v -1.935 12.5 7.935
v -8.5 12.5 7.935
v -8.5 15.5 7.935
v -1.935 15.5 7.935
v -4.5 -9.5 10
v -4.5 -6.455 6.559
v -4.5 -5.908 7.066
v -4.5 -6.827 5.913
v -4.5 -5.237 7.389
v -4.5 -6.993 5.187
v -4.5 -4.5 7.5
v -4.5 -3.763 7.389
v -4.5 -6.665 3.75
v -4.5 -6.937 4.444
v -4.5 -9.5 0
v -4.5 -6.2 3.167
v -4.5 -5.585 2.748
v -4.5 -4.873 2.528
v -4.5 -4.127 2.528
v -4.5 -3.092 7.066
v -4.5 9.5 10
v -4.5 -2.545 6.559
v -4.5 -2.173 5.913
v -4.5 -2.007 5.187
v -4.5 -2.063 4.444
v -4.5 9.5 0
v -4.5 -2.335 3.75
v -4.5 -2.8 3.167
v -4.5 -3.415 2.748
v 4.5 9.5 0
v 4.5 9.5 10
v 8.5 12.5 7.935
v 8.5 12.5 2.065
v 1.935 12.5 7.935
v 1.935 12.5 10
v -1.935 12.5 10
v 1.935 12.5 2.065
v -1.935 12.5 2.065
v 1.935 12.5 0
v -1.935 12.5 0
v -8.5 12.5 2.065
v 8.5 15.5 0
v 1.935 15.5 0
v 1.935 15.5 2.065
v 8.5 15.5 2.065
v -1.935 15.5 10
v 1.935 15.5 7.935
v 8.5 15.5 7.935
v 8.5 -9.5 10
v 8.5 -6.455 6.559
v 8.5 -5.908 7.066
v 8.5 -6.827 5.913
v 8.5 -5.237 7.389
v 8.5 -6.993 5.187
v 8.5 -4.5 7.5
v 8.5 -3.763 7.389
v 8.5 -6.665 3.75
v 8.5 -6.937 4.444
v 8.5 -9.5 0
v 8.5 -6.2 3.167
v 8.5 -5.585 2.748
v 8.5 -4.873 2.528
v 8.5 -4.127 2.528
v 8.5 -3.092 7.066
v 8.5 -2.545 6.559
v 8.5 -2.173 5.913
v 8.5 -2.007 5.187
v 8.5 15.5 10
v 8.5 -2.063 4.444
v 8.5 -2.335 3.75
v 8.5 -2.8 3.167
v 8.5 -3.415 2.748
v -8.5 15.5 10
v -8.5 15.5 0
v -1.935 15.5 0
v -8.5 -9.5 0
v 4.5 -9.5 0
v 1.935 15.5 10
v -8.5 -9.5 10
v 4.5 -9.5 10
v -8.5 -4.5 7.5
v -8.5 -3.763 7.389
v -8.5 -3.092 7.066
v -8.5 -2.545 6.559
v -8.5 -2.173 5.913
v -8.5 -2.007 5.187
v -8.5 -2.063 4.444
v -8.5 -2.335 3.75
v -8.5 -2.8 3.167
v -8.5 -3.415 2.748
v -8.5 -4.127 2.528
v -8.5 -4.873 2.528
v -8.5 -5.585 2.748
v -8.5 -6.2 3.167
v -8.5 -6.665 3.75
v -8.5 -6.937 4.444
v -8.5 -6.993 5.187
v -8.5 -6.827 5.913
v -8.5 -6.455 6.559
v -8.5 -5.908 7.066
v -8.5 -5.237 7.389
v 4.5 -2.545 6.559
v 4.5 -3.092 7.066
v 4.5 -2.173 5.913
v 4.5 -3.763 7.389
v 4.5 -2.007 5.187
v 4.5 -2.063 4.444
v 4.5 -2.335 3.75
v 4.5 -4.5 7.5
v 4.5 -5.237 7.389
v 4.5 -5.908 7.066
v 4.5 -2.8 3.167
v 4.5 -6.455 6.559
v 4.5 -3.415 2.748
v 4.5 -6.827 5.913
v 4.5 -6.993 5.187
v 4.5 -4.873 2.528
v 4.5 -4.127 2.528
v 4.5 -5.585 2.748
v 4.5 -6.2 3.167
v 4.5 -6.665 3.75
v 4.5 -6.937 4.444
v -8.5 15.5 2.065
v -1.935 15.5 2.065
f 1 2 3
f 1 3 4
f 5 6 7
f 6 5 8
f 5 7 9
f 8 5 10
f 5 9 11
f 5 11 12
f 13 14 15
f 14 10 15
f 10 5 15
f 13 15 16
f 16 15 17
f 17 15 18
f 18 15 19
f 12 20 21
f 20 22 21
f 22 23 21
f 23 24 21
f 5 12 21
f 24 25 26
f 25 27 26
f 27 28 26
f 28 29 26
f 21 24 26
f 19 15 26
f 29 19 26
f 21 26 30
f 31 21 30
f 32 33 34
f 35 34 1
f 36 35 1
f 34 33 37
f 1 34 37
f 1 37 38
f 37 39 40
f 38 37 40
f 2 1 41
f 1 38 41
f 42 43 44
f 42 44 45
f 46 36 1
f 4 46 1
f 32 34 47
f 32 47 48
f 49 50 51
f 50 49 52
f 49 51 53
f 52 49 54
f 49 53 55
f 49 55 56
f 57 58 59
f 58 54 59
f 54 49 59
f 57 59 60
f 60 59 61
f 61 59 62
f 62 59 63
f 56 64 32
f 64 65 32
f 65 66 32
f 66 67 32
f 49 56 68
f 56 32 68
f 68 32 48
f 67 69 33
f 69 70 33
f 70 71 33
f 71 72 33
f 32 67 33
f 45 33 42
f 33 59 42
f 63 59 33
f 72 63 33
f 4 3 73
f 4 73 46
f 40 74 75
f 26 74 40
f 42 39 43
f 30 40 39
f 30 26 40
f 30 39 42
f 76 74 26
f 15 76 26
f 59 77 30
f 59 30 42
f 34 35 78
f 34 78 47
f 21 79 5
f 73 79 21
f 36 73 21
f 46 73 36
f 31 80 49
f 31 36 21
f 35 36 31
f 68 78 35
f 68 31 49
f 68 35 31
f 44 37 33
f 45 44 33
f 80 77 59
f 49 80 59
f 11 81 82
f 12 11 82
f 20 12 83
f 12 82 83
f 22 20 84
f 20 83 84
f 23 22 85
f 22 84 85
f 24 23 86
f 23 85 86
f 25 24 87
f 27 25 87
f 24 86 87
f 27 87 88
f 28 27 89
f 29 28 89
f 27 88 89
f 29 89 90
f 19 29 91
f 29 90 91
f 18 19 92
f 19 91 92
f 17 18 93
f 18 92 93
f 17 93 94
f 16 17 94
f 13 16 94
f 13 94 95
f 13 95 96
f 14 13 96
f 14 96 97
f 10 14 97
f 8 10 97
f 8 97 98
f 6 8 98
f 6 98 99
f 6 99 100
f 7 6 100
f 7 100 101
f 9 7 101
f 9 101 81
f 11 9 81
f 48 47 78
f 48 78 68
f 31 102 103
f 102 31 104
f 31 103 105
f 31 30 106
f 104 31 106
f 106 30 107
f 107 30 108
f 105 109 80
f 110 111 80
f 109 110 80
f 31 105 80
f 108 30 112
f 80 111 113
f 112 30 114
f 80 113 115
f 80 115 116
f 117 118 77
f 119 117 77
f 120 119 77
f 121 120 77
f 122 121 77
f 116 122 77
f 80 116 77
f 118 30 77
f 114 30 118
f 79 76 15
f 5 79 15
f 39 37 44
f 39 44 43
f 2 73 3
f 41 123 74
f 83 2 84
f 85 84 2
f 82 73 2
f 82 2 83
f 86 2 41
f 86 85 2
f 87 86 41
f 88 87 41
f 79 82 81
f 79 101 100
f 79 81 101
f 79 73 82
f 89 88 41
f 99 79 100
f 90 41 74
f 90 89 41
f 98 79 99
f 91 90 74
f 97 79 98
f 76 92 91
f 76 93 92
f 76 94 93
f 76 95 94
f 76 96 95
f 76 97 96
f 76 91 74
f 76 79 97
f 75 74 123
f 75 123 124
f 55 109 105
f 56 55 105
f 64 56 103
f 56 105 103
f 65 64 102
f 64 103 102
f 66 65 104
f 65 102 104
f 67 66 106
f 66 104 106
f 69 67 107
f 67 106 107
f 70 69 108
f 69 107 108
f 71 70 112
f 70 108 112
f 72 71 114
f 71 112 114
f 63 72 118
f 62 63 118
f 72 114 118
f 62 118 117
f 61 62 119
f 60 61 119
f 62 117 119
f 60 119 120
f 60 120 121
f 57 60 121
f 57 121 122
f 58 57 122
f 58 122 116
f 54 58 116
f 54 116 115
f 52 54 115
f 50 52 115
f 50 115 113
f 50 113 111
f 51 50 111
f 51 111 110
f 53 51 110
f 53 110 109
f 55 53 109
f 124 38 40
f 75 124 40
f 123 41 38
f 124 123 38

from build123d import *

# Parameters (mm, degrees)
BOSS_EXTRUDE1_DEPTH     = 10
SKETCH2_R               = 2.5
CUT_EXTRUDE1_DEPTH      = 1
CUT_EXTRUDE1_DEPTH_BACK = 18
SKETCH4_W               = 6.565
SKETCH4_H               = 2.065
BOSS_EXTRUDE2_DEPTH     = 3


with BuildPart() as part:
    # Sketch1 → Boss-Extrude1 (new body)
    with BuildSketch(Plane.XY):
        Polygon((-4.5, -9.5), (-4.5, 9.5), (4.5, 9.5), (4.5, -9.5), (8.5, -9.5), (8.5, 12.5), (-8.5, 12.5), (-8.5, -9.5), align=None)
    extrude(amount=BOSS_EXTRUDE1_DEPTH)

    # Sketch2 → Cut-Extrude1 (cut, two sides)
    with BuildSketch(Plane.ZY.offset(8.5)) as cut_extrude1_sk:
        with Locations((5, -4.5)):
            Circle(SKETCH2_R)
    extrude(amount=CUT_EXTRUDE1_DEPTH, mode=Mode.SUBTRACT)
    extrude(cut_extrude1_sk.sketch, amount=-CUT_EXTRUDE1_DEPTH_BACK, mode=Mode.SUBTRACT)

    # Sketch4 → Boss-Extrude2 (add)
    with BuildSketch(Plane(origin=(0, 12.5, 0), x_dir=(1, 0, 0), z_dir=(0, 1, 0))):
        with Locations((-5.2175, -1.0325)):
            Rectangle(SKETCH4_W, SKETCH4_H)
        with Locations((-5.2175, -8.9675)):
            Rectangle(SKETCH4_W, SKETCH4_H)
        with Locations((5.2175, -1.0325)):
            Rectangle(SKETCH4_W, SKETCH4_H)
        with Locations((5.2175, -8.9675)):
            Rectangle(SKETCH4_W, SKETCH4_H)
    extrude(amount=BOSS_EXTRUDE2_DEPTH)


solid = part.part
